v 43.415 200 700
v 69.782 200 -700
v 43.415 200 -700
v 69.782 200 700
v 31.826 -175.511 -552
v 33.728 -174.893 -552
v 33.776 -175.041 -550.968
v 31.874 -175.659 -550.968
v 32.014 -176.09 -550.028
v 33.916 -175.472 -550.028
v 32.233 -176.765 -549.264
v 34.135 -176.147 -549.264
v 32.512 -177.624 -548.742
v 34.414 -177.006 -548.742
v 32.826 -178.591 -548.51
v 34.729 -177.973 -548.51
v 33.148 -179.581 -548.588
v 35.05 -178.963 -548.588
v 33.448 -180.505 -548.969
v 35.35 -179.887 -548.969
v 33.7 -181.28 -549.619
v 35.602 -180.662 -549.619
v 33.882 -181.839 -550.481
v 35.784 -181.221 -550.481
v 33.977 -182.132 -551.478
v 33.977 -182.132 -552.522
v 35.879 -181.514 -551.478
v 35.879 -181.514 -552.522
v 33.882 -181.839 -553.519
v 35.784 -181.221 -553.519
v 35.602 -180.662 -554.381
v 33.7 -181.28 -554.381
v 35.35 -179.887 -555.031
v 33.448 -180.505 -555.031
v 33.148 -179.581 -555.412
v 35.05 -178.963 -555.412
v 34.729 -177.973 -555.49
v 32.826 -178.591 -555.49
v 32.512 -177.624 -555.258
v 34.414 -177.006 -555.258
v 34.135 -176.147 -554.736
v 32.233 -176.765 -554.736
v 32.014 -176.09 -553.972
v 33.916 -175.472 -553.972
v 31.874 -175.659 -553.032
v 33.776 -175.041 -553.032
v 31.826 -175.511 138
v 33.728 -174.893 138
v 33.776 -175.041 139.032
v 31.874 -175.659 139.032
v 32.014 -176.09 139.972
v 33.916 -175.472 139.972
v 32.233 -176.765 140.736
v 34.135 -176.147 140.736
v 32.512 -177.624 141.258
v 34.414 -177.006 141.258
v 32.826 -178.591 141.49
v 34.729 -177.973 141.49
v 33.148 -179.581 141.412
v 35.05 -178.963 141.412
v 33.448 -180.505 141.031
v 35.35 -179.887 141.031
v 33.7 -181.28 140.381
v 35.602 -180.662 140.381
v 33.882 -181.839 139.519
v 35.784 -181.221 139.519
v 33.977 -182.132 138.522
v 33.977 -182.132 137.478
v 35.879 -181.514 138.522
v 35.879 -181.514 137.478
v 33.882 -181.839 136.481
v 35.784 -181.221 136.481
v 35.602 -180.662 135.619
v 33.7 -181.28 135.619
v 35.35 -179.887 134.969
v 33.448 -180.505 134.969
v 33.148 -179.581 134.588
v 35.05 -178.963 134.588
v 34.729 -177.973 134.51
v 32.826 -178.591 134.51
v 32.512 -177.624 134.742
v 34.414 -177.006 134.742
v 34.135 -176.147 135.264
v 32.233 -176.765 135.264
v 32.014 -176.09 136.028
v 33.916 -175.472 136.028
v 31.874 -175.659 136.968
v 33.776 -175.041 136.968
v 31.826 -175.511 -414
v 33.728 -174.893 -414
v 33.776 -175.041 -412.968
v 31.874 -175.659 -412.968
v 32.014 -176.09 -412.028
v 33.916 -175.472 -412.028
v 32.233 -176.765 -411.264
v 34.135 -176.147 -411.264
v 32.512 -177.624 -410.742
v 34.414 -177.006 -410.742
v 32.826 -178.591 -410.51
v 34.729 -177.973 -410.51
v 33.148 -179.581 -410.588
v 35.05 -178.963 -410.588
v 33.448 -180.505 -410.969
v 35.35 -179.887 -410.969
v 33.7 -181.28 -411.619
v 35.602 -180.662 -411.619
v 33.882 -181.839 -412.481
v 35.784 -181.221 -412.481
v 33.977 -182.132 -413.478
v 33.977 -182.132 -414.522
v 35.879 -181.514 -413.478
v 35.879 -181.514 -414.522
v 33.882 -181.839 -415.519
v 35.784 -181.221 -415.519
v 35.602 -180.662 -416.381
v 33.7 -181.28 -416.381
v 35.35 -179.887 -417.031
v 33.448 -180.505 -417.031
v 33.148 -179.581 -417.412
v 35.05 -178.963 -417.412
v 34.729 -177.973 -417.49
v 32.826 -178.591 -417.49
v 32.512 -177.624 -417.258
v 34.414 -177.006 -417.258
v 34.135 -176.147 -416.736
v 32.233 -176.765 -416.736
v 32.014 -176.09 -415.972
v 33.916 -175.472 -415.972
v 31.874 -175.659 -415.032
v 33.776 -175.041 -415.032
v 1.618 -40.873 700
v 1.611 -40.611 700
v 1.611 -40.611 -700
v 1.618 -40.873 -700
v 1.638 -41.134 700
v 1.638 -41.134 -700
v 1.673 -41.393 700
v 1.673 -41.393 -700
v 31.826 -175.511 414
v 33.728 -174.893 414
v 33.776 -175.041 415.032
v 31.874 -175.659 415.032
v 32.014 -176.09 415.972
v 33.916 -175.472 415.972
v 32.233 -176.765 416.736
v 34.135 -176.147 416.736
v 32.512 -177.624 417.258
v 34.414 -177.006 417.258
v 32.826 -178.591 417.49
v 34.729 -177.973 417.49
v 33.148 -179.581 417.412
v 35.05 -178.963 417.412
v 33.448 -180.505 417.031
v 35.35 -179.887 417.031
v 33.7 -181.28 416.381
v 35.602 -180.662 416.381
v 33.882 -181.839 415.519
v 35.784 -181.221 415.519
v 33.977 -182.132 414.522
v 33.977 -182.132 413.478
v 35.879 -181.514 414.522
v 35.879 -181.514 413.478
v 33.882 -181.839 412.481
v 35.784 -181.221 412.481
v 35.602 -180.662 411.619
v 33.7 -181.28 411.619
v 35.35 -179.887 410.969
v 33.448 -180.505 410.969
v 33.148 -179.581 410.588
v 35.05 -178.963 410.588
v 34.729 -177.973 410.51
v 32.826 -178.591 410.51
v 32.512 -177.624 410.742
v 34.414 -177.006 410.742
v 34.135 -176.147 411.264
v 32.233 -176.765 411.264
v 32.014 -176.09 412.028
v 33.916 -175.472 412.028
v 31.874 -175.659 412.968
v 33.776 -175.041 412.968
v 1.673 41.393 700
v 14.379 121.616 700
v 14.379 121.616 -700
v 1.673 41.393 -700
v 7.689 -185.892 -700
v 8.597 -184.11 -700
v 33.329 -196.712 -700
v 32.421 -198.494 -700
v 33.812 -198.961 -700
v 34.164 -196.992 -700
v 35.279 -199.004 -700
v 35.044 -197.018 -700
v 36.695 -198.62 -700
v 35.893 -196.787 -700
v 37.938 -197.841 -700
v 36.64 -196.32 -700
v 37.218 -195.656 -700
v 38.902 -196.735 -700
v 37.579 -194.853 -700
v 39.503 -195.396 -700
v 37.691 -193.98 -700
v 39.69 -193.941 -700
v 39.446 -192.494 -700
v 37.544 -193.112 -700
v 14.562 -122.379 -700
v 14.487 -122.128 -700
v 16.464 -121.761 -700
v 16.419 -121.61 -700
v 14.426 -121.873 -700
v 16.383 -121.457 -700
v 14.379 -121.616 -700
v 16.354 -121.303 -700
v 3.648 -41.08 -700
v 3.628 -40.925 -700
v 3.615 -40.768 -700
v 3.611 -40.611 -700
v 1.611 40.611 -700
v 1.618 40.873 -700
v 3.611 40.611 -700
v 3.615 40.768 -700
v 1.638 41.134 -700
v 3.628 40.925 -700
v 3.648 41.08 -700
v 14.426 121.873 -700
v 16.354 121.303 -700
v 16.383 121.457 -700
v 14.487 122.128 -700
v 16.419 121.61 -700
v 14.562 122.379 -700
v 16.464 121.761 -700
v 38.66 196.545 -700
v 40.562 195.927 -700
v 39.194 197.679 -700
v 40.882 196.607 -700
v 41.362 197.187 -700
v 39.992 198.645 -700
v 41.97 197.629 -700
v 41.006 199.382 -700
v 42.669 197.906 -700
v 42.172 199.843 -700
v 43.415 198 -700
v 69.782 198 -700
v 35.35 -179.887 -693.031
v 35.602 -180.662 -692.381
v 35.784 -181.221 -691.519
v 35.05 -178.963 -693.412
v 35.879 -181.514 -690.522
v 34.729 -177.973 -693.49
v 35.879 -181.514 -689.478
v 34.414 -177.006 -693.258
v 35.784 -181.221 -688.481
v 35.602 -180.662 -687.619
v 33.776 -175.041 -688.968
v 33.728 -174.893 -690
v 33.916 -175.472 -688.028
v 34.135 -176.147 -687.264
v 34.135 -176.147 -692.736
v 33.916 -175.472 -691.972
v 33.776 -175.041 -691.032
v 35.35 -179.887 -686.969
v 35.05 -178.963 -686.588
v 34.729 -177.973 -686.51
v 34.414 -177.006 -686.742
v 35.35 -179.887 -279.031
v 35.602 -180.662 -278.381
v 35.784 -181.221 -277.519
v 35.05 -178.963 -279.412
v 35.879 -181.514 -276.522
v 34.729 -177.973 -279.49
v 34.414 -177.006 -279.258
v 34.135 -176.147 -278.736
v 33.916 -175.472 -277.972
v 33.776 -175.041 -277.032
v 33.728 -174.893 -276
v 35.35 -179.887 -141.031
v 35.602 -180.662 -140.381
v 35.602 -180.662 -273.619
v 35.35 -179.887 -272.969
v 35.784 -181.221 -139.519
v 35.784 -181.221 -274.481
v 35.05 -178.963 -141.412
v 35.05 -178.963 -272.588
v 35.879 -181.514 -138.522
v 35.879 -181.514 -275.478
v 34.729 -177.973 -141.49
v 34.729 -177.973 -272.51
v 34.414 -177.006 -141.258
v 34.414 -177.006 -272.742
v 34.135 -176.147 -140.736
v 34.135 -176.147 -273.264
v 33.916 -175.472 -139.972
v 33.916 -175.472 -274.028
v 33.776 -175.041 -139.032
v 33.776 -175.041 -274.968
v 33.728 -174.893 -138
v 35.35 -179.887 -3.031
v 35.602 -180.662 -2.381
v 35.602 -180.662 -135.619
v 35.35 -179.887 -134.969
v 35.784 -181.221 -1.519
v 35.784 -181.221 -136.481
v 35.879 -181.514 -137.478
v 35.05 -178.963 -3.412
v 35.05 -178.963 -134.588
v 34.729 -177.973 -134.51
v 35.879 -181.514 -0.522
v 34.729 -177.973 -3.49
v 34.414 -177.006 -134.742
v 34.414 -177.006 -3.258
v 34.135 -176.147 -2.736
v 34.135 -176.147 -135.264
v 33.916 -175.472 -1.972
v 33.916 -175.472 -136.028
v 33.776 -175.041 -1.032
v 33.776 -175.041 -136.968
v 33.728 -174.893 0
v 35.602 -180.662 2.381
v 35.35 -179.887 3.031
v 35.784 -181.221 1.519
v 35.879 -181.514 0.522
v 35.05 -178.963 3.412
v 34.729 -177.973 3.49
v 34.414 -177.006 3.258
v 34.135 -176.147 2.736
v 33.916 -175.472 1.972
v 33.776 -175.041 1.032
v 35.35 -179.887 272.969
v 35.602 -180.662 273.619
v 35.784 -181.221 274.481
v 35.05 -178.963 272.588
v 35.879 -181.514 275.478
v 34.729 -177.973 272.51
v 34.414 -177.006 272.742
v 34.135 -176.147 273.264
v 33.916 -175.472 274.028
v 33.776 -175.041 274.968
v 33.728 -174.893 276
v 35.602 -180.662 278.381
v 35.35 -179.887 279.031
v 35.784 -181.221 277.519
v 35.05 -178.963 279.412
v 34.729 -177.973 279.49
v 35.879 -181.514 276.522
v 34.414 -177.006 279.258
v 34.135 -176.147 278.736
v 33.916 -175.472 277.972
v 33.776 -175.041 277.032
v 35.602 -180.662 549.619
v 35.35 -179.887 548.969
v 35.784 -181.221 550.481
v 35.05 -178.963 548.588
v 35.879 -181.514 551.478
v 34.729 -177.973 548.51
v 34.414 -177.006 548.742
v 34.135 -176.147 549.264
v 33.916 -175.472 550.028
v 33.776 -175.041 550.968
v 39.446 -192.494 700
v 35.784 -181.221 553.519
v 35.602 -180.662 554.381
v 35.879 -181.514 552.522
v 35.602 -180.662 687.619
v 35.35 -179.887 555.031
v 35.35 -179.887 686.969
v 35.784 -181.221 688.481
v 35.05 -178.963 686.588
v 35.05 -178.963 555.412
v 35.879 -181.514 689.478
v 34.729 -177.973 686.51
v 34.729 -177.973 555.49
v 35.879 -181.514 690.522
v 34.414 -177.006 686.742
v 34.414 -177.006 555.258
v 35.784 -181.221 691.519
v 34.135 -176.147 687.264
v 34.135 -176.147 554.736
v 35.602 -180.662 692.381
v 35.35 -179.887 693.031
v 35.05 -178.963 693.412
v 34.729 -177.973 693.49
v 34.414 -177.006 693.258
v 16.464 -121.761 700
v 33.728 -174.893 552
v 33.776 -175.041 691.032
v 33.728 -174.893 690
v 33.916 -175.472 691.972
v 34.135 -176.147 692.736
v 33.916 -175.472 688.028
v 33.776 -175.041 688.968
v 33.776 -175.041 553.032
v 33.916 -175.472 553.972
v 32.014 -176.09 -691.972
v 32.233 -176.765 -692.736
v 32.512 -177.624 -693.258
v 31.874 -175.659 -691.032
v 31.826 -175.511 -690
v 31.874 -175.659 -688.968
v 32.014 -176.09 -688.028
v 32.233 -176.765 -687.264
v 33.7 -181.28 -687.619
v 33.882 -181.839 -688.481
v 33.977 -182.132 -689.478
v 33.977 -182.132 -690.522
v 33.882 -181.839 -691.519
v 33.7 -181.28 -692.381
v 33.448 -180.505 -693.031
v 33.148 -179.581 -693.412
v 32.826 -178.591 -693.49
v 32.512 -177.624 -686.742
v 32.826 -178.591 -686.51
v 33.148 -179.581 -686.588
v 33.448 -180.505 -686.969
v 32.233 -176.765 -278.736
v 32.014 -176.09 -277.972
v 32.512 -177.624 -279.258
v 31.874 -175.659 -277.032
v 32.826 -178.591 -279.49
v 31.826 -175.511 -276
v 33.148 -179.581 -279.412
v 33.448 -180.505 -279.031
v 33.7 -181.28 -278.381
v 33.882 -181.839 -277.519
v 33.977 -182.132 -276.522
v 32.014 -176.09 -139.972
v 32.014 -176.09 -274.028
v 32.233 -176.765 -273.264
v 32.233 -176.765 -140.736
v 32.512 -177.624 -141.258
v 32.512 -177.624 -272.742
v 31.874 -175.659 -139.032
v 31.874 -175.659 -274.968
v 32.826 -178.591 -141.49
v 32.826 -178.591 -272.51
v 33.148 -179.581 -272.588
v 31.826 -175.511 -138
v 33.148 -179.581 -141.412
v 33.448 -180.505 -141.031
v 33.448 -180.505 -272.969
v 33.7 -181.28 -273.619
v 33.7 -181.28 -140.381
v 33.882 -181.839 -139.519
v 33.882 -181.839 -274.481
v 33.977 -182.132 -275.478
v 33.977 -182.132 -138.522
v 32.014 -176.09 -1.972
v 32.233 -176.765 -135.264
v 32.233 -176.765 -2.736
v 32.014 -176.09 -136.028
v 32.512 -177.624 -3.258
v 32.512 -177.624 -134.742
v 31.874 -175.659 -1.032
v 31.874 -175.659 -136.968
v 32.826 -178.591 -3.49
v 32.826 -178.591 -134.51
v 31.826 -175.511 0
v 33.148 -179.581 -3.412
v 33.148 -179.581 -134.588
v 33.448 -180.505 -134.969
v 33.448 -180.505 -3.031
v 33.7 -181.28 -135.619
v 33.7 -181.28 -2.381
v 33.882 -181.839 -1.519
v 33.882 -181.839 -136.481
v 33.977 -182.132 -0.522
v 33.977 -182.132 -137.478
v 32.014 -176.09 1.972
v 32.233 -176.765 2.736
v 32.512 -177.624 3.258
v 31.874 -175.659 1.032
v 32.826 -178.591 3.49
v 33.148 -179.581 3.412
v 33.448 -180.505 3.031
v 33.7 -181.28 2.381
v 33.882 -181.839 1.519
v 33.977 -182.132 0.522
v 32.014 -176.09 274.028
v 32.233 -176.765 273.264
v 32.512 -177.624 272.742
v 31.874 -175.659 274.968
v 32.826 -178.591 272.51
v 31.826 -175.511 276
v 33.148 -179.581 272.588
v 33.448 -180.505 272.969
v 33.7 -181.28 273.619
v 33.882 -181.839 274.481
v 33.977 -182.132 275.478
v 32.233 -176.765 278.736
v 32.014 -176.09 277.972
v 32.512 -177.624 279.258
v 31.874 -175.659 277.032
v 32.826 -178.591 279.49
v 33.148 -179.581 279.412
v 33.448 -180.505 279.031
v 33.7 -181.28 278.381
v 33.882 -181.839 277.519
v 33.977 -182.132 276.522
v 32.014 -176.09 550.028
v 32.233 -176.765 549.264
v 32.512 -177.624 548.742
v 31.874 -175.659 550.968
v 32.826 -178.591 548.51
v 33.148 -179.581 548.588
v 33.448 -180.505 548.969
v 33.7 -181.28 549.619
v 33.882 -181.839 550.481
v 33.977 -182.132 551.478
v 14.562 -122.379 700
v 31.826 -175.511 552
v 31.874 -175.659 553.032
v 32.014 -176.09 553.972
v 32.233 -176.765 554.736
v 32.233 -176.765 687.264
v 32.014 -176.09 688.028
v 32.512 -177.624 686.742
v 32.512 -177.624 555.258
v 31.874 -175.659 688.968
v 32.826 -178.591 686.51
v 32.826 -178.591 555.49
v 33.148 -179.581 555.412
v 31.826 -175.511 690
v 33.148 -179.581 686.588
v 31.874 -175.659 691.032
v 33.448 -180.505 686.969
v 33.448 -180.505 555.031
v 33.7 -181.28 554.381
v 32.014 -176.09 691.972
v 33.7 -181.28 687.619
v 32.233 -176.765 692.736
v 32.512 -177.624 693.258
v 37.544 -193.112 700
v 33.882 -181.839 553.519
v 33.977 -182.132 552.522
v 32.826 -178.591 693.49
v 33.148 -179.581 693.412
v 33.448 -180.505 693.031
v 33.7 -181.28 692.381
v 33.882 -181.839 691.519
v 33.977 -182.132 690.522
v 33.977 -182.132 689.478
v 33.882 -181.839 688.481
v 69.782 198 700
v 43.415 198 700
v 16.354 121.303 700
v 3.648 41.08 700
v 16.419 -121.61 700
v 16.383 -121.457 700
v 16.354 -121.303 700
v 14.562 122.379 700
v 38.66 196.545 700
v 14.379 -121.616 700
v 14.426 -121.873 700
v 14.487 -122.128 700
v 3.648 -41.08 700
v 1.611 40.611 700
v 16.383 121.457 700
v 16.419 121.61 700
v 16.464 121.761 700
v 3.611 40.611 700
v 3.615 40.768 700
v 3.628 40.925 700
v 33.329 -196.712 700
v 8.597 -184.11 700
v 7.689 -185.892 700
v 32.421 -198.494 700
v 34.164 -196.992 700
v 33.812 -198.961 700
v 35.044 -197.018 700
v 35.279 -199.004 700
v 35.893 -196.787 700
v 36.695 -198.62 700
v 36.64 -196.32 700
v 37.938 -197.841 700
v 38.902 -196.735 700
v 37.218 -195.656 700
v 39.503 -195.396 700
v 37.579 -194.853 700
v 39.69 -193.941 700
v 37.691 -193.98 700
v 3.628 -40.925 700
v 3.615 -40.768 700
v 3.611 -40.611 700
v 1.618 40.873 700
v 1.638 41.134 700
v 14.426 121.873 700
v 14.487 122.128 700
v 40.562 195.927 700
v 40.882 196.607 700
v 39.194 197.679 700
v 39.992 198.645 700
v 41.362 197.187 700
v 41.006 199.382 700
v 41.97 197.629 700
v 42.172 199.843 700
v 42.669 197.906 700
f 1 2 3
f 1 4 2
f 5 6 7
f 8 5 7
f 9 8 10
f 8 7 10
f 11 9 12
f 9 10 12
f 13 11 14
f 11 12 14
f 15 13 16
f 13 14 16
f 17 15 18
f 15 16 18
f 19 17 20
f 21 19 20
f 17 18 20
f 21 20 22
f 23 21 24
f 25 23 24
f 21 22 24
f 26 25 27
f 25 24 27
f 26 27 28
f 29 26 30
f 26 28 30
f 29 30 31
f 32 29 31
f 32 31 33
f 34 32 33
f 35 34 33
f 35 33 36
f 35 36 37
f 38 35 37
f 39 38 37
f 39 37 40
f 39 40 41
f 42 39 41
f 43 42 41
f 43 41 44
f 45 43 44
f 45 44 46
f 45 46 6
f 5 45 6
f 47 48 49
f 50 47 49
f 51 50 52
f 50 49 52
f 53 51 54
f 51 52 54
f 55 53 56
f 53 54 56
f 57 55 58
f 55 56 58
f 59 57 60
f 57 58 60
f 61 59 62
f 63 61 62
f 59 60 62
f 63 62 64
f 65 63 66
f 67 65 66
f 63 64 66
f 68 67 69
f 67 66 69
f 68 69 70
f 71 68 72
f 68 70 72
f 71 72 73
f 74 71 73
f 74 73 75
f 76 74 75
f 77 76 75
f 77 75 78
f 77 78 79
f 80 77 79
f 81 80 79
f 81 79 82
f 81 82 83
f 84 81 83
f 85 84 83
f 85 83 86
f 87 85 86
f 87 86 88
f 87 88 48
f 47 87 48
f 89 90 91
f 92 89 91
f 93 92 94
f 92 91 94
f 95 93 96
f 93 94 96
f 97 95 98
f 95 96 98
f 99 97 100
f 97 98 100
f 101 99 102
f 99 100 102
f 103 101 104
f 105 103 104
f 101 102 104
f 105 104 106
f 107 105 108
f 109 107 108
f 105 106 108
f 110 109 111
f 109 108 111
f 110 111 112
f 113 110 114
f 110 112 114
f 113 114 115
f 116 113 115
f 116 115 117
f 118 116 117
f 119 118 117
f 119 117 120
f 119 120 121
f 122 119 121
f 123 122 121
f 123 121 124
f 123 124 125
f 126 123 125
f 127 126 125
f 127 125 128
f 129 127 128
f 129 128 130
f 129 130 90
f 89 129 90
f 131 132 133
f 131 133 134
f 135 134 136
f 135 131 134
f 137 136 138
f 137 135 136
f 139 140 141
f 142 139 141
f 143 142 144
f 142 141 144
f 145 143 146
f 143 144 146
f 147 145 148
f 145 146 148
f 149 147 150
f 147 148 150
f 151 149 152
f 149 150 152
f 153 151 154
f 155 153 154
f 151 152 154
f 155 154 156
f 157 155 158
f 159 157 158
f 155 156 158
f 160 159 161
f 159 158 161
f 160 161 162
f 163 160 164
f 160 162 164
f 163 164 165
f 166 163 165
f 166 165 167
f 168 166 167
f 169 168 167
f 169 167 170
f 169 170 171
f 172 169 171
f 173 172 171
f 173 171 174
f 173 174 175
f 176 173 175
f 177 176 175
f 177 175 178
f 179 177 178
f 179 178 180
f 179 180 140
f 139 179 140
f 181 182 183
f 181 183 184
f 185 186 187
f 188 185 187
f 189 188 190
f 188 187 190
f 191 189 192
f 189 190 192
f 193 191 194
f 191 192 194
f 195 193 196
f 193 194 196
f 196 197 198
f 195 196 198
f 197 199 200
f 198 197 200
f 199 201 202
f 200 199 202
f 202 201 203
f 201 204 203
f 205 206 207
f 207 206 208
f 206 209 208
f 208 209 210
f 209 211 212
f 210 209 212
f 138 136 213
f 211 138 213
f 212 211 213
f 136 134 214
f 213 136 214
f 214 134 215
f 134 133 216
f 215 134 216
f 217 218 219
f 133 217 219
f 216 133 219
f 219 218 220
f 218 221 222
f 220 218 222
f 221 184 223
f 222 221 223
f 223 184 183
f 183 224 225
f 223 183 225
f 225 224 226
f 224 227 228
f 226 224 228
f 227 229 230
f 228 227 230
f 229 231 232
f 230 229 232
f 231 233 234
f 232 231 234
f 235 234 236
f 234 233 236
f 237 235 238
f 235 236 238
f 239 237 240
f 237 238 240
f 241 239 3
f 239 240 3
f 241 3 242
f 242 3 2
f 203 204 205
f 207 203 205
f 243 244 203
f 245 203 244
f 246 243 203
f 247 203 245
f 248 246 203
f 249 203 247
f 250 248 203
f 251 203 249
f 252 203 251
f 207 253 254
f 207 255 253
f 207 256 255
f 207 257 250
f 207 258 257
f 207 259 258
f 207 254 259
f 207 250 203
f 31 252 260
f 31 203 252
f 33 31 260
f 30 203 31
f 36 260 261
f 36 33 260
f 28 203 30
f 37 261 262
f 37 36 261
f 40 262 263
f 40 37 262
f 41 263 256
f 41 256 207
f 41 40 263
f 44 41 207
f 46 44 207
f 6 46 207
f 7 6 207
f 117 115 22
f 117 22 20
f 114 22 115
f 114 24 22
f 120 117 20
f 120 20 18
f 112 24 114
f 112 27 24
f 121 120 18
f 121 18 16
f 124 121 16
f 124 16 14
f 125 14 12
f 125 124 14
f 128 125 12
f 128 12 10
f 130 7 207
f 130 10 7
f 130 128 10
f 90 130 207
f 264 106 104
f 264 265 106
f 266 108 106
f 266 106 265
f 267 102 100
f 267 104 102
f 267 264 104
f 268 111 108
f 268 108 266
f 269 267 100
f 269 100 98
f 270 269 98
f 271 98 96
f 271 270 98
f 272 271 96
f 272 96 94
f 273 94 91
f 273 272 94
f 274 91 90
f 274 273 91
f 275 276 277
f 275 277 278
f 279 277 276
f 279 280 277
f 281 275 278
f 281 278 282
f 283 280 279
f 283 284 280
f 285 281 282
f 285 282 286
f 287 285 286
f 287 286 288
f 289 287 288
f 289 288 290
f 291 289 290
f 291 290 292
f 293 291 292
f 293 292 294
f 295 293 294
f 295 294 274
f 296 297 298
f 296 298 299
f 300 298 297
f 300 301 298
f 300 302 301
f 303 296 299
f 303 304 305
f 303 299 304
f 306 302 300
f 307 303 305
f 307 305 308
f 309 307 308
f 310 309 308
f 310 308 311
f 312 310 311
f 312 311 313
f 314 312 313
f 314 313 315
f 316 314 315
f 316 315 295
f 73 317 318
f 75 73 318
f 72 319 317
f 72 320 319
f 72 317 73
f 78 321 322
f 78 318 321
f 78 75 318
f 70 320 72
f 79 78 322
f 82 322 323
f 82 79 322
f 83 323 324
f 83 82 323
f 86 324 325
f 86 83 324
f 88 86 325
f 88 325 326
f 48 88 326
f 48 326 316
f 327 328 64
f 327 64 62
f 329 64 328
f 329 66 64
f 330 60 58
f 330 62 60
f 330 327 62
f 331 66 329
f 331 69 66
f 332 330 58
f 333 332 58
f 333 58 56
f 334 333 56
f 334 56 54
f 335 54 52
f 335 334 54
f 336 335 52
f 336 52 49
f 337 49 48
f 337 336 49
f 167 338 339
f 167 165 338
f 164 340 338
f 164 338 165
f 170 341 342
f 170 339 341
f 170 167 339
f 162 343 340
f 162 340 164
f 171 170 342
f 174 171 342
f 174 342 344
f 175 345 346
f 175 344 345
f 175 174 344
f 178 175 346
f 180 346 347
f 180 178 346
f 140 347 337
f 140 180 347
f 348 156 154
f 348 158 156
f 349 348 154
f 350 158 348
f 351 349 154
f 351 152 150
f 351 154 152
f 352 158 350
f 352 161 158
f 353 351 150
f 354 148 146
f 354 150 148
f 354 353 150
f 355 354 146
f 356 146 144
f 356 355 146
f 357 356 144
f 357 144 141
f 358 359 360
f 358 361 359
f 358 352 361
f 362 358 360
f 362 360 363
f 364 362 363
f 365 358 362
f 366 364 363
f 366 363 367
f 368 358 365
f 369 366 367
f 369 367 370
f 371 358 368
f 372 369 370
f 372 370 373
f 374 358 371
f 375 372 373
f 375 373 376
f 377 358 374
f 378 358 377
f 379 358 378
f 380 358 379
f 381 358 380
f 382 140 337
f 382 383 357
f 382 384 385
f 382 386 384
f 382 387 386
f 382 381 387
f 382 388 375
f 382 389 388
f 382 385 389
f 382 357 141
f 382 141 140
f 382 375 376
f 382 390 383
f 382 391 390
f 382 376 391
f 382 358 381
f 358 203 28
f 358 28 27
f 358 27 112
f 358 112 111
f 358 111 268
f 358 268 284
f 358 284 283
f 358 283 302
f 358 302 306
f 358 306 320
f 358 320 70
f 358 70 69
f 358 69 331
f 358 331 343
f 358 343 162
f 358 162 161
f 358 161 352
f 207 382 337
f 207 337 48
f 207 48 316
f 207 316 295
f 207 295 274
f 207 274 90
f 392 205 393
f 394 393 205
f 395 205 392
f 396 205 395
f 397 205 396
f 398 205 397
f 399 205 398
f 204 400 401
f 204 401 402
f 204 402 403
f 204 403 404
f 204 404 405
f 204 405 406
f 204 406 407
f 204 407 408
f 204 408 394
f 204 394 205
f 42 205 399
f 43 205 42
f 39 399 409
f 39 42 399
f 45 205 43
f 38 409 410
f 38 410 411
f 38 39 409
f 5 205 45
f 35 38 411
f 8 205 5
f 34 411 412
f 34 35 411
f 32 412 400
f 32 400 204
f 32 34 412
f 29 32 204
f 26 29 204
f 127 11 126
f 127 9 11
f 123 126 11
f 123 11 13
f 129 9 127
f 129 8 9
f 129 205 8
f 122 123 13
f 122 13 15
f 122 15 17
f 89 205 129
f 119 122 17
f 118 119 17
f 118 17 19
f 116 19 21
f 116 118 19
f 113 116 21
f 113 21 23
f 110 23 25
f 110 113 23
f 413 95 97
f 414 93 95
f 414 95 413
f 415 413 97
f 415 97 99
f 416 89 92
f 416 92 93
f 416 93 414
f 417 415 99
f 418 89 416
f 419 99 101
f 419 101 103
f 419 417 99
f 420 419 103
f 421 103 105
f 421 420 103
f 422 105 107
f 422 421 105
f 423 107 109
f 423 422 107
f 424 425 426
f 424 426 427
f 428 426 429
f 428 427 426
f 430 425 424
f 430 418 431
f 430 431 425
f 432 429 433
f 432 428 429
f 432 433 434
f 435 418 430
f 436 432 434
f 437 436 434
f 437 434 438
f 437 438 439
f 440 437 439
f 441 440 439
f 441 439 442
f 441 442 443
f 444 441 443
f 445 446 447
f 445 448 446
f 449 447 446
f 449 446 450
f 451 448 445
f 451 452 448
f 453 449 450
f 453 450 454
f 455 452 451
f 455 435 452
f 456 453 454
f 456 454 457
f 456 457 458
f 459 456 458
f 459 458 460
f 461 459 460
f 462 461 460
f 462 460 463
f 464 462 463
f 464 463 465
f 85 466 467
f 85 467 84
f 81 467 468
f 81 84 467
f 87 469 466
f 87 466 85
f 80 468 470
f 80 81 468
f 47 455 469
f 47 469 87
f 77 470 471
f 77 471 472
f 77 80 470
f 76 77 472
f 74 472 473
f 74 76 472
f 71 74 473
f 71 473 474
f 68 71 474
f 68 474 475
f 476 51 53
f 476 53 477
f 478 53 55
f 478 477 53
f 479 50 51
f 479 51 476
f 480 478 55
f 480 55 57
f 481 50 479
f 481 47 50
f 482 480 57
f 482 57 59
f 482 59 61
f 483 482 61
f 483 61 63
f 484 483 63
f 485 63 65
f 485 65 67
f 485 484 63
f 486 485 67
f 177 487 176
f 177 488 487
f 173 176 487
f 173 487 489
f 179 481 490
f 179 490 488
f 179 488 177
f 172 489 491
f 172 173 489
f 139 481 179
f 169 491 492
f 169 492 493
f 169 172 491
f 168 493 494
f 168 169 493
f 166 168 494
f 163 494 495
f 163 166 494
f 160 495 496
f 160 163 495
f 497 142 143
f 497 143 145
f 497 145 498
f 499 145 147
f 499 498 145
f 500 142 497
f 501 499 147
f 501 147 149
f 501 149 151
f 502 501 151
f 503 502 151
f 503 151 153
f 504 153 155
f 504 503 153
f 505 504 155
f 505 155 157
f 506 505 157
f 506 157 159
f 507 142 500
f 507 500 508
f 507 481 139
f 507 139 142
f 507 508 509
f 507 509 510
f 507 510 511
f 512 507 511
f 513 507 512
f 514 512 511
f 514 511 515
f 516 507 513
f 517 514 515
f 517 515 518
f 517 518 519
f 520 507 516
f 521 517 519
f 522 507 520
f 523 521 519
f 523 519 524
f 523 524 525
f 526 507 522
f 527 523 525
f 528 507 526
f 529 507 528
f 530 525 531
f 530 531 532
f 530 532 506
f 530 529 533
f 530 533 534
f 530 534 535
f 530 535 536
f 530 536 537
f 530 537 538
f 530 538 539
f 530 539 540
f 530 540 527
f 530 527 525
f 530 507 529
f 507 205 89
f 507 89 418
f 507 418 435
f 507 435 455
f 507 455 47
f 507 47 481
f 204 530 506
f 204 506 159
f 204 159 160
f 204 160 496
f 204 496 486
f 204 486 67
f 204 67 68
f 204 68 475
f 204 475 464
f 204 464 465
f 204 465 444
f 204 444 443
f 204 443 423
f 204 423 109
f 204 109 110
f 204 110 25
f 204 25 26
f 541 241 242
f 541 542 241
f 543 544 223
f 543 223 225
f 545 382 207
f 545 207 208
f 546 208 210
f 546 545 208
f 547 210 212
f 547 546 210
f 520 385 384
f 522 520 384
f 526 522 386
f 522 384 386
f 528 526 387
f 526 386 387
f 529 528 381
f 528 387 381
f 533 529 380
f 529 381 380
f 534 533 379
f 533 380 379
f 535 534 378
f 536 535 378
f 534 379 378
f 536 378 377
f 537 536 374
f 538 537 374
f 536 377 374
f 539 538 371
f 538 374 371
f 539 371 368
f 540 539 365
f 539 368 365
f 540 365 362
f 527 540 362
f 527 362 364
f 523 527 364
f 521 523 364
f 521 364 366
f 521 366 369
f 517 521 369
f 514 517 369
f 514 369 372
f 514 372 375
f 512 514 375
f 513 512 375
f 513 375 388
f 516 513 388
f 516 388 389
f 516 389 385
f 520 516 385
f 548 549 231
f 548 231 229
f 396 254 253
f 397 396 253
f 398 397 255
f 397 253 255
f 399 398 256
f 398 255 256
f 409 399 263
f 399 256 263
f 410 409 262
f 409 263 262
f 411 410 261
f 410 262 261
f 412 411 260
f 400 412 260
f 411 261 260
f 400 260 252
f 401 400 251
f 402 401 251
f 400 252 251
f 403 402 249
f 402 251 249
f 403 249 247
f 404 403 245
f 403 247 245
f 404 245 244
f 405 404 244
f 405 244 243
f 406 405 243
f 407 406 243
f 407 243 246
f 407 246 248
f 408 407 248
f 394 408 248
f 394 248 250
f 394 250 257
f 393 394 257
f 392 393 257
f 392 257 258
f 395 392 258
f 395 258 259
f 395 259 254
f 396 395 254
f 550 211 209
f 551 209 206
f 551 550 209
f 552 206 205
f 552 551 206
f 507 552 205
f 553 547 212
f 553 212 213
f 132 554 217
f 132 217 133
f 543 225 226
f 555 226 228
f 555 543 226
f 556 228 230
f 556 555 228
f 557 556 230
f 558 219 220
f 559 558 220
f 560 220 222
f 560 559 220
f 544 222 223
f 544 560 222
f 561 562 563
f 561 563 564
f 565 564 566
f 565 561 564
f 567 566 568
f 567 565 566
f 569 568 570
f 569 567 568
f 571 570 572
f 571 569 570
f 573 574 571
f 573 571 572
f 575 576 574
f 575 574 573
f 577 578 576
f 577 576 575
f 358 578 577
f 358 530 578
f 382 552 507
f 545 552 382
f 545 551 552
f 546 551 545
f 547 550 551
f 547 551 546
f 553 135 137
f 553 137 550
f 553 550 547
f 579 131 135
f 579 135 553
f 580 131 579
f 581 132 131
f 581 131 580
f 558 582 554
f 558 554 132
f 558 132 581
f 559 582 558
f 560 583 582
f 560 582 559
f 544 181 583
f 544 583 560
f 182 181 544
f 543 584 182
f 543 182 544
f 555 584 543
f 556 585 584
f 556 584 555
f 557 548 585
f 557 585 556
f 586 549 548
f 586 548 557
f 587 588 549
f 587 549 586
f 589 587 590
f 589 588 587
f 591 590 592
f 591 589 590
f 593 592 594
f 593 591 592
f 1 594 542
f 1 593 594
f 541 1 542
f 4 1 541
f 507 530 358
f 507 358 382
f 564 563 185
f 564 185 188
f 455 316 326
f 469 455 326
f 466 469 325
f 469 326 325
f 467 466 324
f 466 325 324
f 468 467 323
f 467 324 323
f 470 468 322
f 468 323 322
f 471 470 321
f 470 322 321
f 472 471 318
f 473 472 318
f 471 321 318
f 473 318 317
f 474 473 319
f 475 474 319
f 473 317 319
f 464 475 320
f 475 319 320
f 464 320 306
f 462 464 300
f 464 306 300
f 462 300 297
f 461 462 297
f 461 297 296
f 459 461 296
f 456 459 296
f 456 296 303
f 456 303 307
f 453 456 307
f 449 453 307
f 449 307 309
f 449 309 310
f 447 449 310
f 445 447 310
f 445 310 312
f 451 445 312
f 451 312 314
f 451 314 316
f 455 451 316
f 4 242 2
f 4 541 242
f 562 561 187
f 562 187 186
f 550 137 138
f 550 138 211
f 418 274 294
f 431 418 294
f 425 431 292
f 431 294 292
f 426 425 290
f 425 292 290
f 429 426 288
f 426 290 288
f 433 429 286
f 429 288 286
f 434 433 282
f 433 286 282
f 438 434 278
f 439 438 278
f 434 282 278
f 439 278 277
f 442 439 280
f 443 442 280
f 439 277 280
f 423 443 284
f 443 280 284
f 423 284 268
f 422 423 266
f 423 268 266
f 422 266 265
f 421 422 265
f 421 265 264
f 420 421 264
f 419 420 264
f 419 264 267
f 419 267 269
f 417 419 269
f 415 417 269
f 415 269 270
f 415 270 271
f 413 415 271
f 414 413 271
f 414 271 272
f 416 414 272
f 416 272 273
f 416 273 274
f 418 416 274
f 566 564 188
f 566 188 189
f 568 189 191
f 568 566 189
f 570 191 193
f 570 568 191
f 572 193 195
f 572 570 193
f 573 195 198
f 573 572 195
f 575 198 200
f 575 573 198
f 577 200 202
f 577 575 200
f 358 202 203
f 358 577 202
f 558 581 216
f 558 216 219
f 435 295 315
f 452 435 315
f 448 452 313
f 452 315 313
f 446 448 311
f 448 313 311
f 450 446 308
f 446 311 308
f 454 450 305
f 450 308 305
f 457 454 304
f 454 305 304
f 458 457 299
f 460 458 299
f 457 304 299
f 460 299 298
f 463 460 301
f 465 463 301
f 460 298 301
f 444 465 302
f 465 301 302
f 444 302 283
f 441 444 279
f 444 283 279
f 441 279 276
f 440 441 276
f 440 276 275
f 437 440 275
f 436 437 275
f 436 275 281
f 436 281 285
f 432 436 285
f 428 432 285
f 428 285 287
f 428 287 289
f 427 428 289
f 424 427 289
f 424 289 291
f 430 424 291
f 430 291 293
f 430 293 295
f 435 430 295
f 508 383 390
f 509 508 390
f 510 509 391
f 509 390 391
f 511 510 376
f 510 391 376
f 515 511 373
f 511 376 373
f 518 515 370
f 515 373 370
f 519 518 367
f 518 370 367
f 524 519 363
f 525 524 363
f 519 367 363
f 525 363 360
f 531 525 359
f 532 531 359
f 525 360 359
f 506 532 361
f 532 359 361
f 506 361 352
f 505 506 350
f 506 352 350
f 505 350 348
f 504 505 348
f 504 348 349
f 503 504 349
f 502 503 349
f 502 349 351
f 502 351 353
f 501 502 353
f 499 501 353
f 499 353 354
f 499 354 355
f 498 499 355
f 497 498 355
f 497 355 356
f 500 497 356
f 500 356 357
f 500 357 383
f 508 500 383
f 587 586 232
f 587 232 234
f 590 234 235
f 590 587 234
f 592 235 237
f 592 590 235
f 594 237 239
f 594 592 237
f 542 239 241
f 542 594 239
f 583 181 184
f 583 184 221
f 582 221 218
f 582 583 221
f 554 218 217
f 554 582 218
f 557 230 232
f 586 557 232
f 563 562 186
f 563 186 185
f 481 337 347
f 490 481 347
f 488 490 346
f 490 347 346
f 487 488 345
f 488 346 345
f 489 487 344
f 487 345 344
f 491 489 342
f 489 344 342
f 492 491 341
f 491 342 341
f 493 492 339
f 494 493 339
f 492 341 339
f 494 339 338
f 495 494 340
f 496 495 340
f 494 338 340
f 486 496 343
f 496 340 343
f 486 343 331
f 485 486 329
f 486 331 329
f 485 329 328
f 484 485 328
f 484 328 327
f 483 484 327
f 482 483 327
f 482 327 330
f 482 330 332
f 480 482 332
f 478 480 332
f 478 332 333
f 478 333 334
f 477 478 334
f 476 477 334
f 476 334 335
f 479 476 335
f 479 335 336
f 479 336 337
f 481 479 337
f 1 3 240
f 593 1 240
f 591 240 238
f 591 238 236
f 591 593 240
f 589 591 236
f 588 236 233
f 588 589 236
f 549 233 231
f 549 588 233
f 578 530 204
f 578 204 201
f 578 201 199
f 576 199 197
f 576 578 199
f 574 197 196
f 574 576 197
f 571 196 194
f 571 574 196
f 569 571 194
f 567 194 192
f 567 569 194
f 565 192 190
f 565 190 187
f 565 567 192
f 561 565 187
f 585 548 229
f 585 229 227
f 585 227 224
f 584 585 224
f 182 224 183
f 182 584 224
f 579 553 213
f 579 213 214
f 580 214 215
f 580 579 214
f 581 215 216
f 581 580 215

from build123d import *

# Parameters (mm, degrees)
SM_BASE_FLANGE_1_DEPTH = 700
SKETCH_2_R             = 3.5
CUT_EXTRUDE_1_DEPTH    = 5


# Sheet-metal steps are written as plain solids
with BuildPart() as part:
    # Sketch 1 → Базовая кромка1 (new body)
    with BuildSketch(Plane.XY):
        with BuildLine():
            Line((69.782473476, 200), (43.415186116, 200))
            ThreePointArc((43.415186116, 200), (40.476259854, 199.045084972), (38.659903534, 196.545084972))
            Line((38.659903534, 196.545084972), (14.561776314, 122.37867555))
            ThreePointArc((14.561776314, 122.37867555), (14.455209294, 122.000817397), (14.378617193, 121.615762903))
            Line((14.378617193, 121.615762903), (1.672637328, 41.393363285))
            ThreePointArc((1.672637328, 41.393363285), (1.626492362, 41.003486439), (1.611079031, 40.61119096))
            Line((1.611079031, 40.61119096), (1.611079031, -40.61119096))
            ThreePointArc((1.611079031, -40.61119096), (1.626492362, -41.003486439), (1.672637328, -41.393363285))
            Line((1.672637328, -41.393363285), (14.378617193, -121.615762903))
            ThreePointArc((14.378617193, -121.615762903), (14.455209294, -122.000817397), (14.561776314, -122.37867555))
            Line((14.561776314, -122.37867555), (37.544374419, -193.111839379))
            ThreePointArc((37.544374419, -193.111839379), (36.639549016, -196.320108259), (33.329233371, -196.711909935))
            Line((33.329233371, -196.711909935), (8.597245129, -184.110332509))
            Line((8.597245129, -184.110332509), (7.68926413, -185.892345557))
            Line((7.68926413, -185.892345557), (32.421252372, -198.493922983))
            ThreePointArc((32.421252372, -198.493922983), (37.938445112, -197.84092019), (39.446487452, -192.493805391))
            Line((39.446487452, -192.493805391), (16.463889347, -121.760641561))
            ThreePointArc((16.463889347, -121.760641561), (16.399949135, -121.53392667), (16.353993874, -121.302893973))
            Line((16.353993874, -121.302893973), (3.648014009, -41.080494355))
            ThreePointArc((3.648014009, -41.080494355), (3.62032703, -40.846568247), (3.611079031, -40.61119096))
            Line((3.611079031, -40.61119096), (3.611079031, 40.61119096))
            ThreePointArc((3.611079031, 40.61119096), (3.62032703, 40.846568247), (3.648014009, 41.080494355))
            Line((3.648014009, 41.080494355), (16.353993874, 121.302893973))
            ThreePointArc((16.353993874, 121.302893973), (16.399949135, 121.53392667), (16.463889347, 121.760641561))
            Line((16.463889347, 121.760641561), (40.562016567, 195.927050983))
            ThreePointArc((40.562016567, 195.927050983), (41.651830359, 197.427050983), (43.415186116, 198))
            Line((43.415186116, 198), (69.782473476, 198))
            Line((69.782473476, 198), (69.782473476, 200))
        make_face()
    extrude(amount=SM_BASE_FLANGE_1_DEPTH)

    # Зеркальное отражение1: part across plane


with BuildPart() as part_1:
    add(part.part)
    add(part.part.mirror(Plane(origin=(34.691204871, -194.038890362, 0), x_dir=(1, 0, 0), z_dir=(0, 0, 1))))

    # Sketch 2 → Вырез-Вытянуть1 (cut)
    with BuildSketch(Plane(origin=(-20.892826899, -6.788490969, 0), x_dir=(0, 0, -1), z_dir=(0.9510565162951543, 0.3090169943749452, 0))):
        with Locations(Location((-690, -180.2560263, 0), (0, 0, 90))):
            Circle(SKETCH_2_R)
        with Locations(Location((-552, -180.2560263, 0), (0, 0, 90))):
            Circle(SKETCH_2_R)
        with Locations(Location((-414, -180.2560263, 0), (0, 0, 90))):
            Circle(SKETCH_2_R)
        with Locations(Location((-276, -180.2560263, 0), (0, 0, 90))):
            Circle(SKETCH_2_R)
        with Locations(Location((-138, -180.2560263, 0), (0, 0, 90))):
            Circle(SKETCH_2_R)
        with Locations(Location((0, -180.2560263, 0), (0, 0, 90))):
            Circle(SKETCH_2_R)
        with Locations(Location((690, -180.2560263, 0), (0, 0, 90))):
            Circle(SKETCH_2_R)
        with Locations(Location((552, -180.2560263, 0), (0, 0, 90))):
            Circle(SKETCH_2_R)
        with Locations(Location((414, -180.2560263, 0), (0, 0, 90))):
            Circle(SKETCH_2_R)
        with Locations(Location((276, -180.2560263, 0), (0, 0, 90))):
            Circle(SKETCH_2_R)
        with Locations(Location((138, -180.2560263, 0), (0, 0, 90))):
            Circle(SKETCH_2_R)
    extrude(amount=-CUT_EXTRUDE_1_DEPTH, mode=Mode.SUBTRACT)


solid = part_1.part
